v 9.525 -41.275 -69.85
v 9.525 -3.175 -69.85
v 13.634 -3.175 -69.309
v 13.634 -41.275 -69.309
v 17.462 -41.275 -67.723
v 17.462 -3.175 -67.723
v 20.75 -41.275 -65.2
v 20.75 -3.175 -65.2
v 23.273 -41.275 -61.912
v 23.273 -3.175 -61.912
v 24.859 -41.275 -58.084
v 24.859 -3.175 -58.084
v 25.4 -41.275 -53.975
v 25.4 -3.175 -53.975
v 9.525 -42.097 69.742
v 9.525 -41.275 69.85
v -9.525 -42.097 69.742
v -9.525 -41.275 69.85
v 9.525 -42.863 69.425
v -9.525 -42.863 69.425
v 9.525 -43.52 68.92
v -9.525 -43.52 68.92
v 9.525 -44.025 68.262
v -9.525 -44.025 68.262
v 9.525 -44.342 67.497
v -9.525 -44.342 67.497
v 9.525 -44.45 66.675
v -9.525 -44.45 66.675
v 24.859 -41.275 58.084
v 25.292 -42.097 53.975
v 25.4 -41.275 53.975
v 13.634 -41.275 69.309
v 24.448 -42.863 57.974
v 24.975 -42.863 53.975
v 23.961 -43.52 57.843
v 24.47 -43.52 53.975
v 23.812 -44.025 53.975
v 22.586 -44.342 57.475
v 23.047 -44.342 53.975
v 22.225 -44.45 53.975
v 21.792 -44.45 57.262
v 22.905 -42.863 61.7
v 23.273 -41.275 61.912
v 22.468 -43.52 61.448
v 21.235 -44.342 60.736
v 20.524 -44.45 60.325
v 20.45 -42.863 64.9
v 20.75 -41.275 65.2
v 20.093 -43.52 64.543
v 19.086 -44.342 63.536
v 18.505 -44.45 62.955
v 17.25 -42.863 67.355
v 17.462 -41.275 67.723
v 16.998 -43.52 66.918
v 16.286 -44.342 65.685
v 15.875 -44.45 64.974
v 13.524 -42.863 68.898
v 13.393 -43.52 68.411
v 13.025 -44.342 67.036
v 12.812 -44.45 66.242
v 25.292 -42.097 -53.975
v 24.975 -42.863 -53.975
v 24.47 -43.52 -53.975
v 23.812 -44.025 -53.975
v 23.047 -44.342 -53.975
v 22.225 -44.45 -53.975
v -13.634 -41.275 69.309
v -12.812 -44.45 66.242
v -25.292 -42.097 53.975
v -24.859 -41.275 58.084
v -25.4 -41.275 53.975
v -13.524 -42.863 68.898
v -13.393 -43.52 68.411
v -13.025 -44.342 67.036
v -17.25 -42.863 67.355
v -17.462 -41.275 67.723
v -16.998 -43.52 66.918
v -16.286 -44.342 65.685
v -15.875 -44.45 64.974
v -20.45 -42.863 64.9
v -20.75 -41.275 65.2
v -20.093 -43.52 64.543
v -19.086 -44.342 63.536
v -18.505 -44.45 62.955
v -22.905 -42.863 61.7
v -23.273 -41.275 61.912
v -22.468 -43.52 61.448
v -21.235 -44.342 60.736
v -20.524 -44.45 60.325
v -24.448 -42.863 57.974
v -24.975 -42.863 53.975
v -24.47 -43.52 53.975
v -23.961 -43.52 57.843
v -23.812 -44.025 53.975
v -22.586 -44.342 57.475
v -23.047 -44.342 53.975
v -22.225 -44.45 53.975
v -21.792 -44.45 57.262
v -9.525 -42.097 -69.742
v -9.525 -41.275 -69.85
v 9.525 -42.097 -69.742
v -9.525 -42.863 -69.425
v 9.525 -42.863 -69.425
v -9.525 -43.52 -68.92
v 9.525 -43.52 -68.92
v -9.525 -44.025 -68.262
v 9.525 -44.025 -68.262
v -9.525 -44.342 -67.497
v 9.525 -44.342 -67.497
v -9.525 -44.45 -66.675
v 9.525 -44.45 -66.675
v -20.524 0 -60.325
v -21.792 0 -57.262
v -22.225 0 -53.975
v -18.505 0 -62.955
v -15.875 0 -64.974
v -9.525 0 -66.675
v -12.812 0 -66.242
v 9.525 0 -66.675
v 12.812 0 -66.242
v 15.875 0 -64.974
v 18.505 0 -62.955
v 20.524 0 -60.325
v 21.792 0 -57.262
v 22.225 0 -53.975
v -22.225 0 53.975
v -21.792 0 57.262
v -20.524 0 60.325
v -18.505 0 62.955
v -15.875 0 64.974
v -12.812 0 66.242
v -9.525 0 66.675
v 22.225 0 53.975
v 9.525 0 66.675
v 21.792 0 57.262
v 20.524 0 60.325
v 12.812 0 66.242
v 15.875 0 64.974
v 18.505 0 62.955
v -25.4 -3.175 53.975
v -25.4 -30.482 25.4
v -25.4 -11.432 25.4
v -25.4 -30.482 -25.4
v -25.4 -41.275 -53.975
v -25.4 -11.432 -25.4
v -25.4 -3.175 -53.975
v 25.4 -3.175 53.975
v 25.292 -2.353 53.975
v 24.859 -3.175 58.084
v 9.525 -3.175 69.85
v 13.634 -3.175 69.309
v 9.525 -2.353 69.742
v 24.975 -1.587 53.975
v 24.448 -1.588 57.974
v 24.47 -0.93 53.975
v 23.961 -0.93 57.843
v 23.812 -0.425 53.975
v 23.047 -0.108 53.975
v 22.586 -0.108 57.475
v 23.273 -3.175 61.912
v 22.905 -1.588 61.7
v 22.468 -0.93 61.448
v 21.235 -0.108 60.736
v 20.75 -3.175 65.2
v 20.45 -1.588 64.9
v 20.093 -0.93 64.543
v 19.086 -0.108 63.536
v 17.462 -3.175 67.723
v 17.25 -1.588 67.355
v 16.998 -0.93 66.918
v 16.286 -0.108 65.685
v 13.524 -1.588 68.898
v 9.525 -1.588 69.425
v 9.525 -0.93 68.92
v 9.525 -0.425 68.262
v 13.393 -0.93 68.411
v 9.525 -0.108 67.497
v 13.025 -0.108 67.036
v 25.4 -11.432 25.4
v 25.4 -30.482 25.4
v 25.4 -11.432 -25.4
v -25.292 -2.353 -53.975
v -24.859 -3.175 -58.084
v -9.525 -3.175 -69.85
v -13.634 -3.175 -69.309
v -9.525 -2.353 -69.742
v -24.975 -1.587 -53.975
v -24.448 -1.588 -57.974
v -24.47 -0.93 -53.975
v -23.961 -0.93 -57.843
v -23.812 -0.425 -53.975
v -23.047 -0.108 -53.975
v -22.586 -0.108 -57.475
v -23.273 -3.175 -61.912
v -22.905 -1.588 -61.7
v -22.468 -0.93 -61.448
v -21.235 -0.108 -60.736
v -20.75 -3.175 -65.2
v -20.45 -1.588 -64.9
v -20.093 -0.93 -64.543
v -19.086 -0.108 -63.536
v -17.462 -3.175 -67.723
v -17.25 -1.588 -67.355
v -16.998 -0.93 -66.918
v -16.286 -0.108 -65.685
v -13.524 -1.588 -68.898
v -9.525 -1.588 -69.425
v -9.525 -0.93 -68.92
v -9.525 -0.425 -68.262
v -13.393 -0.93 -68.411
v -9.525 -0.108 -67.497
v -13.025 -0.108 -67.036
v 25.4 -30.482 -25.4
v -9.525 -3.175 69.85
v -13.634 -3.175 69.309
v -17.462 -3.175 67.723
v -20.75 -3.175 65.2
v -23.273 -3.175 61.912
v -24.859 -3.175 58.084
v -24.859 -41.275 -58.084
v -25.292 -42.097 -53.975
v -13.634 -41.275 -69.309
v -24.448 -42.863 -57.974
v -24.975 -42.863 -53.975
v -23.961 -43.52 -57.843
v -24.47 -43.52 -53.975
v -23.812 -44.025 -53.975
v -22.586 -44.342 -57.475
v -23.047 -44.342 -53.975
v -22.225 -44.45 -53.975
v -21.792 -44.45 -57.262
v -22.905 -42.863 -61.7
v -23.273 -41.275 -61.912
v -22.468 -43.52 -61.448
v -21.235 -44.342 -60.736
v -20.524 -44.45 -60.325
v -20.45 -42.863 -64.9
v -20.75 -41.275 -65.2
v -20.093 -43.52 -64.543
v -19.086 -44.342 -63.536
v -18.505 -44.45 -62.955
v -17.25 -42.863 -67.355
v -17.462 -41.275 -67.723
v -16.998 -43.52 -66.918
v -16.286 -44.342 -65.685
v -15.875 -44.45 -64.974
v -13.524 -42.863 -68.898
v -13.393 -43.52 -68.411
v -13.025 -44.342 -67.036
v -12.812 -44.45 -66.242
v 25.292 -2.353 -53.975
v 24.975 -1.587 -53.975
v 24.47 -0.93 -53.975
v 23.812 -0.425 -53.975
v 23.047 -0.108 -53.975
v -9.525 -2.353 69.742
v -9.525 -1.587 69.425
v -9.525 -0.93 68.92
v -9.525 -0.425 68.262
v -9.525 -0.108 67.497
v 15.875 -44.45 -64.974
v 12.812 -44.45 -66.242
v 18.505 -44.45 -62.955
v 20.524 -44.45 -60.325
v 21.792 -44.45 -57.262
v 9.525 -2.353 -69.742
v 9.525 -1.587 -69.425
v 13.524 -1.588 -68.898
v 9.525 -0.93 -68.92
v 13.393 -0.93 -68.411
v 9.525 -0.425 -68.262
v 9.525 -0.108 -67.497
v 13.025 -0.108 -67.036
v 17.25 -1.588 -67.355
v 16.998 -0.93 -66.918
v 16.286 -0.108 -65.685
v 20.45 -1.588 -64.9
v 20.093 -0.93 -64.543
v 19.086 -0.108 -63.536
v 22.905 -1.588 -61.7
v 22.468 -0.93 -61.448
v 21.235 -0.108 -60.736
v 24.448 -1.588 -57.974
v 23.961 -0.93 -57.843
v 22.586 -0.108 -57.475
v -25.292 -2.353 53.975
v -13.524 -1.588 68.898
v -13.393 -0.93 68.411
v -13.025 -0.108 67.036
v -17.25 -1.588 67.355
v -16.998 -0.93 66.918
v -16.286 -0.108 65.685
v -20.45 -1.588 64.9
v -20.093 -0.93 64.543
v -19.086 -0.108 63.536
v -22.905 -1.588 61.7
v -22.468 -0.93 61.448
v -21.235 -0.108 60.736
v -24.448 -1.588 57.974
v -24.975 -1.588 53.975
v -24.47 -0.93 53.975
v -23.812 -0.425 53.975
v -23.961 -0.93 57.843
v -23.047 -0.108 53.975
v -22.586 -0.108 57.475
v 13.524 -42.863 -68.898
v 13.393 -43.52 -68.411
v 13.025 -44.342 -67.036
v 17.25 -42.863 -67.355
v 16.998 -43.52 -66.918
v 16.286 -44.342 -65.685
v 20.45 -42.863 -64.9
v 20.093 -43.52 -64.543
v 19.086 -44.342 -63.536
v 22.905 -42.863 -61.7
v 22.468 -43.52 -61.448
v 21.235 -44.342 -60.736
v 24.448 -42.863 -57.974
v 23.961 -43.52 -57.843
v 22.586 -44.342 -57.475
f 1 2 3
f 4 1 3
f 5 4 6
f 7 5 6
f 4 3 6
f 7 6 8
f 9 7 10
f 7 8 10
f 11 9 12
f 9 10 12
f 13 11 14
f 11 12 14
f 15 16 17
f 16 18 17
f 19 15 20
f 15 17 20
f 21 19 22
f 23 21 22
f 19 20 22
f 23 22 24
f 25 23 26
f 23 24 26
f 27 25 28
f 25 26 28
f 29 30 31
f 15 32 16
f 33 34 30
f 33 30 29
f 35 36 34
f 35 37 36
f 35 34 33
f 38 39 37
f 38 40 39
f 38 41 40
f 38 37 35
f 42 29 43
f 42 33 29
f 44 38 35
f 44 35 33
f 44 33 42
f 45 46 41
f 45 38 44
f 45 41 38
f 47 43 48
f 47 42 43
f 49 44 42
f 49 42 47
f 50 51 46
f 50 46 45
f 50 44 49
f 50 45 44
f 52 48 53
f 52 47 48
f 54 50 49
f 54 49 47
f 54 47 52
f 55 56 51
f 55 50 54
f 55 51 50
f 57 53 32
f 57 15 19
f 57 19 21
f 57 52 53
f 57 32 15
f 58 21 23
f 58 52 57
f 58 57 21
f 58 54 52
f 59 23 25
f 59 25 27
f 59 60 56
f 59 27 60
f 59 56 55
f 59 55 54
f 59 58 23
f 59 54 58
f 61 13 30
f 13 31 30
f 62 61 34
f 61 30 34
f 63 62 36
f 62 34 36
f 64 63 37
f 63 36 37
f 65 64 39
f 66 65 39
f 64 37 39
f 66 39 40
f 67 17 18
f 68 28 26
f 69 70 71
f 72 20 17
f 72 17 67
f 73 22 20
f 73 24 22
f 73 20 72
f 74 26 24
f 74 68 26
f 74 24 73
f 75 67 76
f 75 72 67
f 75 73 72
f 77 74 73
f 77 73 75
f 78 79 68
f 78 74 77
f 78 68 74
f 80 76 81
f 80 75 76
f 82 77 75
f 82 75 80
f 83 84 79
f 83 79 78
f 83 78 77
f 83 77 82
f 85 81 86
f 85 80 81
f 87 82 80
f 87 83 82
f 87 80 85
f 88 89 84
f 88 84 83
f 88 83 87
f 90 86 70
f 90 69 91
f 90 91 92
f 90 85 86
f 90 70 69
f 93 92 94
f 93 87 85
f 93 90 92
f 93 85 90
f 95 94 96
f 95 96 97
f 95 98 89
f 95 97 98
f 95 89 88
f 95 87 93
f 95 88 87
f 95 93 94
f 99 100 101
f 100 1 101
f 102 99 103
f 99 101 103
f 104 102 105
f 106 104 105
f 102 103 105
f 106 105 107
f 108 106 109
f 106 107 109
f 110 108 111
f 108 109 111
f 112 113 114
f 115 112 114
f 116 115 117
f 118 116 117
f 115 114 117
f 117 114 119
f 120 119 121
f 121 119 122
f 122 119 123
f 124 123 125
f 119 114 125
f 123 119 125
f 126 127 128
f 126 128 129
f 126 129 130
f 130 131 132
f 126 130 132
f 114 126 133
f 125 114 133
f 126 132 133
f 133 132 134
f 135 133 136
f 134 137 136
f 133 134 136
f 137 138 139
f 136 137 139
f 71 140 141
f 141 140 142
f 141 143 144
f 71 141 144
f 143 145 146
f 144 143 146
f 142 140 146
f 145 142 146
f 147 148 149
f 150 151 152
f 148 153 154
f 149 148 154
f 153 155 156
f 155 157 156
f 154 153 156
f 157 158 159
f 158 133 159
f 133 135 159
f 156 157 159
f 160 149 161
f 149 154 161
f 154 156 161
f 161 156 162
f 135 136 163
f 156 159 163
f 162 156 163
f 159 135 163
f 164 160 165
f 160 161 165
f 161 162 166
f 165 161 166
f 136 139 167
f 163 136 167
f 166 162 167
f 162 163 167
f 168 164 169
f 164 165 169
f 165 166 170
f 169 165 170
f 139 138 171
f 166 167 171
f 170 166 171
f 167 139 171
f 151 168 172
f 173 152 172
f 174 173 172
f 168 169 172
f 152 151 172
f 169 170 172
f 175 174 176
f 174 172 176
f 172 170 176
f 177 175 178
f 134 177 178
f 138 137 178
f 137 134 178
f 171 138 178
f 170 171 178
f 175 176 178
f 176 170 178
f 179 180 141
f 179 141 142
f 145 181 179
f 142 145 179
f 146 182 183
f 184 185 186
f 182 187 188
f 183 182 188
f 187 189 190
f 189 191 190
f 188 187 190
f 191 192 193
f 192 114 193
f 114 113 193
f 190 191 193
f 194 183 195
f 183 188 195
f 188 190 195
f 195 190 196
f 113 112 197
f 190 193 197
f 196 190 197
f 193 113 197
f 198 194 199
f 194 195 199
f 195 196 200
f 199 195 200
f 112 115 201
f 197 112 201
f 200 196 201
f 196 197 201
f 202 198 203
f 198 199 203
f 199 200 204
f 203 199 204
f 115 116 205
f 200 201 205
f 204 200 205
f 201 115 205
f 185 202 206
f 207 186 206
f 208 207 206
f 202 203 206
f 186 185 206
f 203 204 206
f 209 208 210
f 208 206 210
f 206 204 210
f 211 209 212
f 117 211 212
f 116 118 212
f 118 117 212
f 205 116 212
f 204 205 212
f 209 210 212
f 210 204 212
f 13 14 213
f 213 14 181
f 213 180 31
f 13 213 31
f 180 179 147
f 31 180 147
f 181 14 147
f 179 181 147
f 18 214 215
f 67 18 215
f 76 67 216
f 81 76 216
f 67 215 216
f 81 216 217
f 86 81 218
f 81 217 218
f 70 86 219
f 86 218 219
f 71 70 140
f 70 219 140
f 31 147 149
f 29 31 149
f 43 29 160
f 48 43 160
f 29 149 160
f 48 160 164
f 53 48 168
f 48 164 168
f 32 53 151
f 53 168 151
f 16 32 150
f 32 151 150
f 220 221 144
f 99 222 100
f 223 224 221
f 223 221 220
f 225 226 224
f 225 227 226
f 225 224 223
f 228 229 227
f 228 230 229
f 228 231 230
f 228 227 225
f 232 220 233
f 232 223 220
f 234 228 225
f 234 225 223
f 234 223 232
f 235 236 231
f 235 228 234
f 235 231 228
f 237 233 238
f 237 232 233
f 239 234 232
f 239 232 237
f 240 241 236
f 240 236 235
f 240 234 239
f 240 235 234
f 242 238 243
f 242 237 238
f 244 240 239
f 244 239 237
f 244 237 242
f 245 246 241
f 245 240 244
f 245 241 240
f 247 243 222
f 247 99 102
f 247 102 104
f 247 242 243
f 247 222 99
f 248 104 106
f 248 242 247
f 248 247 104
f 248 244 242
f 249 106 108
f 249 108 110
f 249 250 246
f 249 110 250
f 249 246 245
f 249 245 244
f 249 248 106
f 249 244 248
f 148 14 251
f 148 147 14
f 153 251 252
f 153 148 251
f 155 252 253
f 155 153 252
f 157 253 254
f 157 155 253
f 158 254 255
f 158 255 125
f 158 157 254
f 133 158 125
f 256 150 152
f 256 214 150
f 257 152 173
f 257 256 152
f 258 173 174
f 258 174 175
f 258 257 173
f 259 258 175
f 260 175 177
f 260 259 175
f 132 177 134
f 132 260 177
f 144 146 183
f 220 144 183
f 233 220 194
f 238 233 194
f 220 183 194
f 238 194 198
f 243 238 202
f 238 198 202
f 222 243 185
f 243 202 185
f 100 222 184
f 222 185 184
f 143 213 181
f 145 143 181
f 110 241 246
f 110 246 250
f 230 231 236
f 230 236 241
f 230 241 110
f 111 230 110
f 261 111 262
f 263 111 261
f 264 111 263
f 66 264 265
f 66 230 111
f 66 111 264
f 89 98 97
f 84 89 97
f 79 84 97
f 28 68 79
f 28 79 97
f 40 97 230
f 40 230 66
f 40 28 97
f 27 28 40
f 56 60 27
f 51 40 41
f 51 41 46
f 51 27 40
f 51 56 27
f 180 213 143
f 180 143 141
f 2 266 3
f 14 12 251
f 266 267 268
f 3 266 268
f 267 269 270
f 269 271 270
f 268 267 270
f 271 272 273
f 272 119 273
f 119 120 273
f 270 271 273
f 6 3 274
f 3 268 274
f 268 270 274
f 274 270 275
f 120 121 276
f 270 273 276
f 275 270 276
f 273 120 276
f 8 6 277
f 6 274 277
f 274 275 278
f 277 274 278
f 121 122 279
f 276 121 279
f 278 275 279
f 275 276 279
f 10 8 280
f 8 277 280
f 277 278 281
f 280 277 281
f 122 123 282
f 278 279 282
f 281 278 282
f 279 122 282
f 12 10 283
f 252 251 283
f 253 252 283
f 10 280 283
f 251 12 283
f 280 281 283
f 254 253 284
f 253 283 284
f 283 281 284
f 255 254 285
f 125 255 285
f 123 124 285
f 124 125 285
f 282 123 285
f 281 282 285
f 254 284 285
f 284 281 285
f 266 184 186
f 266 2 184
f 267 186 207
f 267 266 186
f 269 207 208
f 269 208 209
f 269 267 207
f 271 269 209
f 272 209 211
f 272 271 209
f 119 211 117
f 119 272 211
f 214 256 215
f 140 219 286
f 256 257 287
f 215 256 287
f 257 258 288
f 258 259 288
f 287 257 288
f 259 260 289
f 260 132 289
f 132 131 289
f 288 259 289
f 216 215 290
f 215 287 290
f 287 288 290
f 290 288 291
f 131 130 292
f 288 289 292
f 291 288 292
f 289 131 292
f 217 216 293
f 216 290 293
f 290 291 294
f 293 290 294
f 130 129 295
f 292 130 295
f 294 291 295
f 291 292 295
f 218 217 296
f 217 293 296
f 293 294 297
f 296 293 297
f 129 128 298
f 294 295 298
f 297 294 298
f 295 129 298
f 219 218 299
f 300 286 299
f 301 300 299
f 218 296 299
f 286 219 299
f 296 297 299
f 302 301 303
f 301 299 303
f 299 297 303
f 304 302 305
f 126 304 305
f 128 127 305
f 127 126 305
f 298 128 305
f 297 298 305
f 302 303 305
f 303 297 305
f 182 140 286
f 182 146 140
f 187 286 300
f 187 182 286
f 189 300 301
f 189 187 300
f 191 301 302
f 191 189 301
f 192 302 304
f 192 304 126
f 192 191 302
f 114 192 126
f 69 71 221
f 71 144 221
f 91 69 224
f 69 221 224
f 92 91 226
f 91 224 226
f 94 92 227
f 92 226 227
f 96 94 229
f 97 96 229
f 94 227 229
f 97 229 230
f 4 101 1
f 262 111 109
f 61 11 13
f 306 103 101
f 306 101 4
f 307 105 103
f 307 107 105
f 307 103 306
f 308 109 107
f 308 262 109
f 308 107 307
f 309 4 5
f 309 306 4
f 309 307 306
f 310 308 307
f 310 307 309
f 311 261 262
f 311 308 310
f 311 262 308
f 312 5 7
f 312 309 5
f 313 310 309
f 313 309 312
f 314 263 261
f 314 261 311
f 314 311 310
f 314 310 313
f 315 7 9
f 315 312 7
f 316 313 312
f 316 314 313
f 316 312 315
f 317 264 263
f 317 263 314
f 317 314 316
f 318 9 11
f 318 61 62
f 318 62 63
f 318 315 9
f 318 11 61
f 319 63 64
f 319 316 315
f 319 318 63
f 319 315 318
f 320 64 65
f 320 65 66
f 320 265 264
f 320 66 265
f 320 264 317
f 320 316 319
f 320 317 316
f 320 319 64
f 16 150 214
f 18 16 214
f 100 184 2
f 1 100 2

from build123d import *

# Parameters (mm, degrees)
F1_DEPTH = 44.45
F2_R     = 3.175
F3_W     = 19.05
F3_H     = 50.8
F4_DEPTH = 127


with BuildPart() as f1:
    # F0 (on Front) → F1 (new body)
    with BuildSketch(Plane.XZ):
        with BuildLine():
            Line((9.525, 69.85), (-9.525, 69.85))
            ThreePointArc((-9.525, 69.85), (-20.75032, 65.20032), (-25.4, 53.975))
            Line((-25.4, 53.975), (-25.4, -53.975))
            ThreePointArc((-25.4, -53.975), (-20.75032, -65.20032), (-9.525, -69.85))
            Line((-9.525, -69.85), (9.525, -69.85))
            ThreePointArc((9.525, -69.85), (20.75032, -65.20032), (25.4, -53.975))
            Line((25.4, -53.975), (25.4, 53.975))
            ThreePointArc((25.4, 53.975), (20.75032, 65.20032), (9.525, 69.85))
        make_face()
    extrude(amount=F1_DEPTH)

    # F2
    f2_edges = [f1.edges().sort_by_distance(p)[0] for p in [
        (-25.4, -44.45, 0),
        (25.4, 0, 0),
    ]]
    fillet(f2_edges, radius=F2_R)

    # F3 (on Right) → F4 (cut, symmetric)
    with BuildSketch(Plane.YZ):
        with Locations((-20.957332, 0)):
            Rectangle(F3_W, F3_H)
    extrude(amount=F4_DEPTH, both=True, mode=Mode.SUBTRACT)


solid = f1.part
